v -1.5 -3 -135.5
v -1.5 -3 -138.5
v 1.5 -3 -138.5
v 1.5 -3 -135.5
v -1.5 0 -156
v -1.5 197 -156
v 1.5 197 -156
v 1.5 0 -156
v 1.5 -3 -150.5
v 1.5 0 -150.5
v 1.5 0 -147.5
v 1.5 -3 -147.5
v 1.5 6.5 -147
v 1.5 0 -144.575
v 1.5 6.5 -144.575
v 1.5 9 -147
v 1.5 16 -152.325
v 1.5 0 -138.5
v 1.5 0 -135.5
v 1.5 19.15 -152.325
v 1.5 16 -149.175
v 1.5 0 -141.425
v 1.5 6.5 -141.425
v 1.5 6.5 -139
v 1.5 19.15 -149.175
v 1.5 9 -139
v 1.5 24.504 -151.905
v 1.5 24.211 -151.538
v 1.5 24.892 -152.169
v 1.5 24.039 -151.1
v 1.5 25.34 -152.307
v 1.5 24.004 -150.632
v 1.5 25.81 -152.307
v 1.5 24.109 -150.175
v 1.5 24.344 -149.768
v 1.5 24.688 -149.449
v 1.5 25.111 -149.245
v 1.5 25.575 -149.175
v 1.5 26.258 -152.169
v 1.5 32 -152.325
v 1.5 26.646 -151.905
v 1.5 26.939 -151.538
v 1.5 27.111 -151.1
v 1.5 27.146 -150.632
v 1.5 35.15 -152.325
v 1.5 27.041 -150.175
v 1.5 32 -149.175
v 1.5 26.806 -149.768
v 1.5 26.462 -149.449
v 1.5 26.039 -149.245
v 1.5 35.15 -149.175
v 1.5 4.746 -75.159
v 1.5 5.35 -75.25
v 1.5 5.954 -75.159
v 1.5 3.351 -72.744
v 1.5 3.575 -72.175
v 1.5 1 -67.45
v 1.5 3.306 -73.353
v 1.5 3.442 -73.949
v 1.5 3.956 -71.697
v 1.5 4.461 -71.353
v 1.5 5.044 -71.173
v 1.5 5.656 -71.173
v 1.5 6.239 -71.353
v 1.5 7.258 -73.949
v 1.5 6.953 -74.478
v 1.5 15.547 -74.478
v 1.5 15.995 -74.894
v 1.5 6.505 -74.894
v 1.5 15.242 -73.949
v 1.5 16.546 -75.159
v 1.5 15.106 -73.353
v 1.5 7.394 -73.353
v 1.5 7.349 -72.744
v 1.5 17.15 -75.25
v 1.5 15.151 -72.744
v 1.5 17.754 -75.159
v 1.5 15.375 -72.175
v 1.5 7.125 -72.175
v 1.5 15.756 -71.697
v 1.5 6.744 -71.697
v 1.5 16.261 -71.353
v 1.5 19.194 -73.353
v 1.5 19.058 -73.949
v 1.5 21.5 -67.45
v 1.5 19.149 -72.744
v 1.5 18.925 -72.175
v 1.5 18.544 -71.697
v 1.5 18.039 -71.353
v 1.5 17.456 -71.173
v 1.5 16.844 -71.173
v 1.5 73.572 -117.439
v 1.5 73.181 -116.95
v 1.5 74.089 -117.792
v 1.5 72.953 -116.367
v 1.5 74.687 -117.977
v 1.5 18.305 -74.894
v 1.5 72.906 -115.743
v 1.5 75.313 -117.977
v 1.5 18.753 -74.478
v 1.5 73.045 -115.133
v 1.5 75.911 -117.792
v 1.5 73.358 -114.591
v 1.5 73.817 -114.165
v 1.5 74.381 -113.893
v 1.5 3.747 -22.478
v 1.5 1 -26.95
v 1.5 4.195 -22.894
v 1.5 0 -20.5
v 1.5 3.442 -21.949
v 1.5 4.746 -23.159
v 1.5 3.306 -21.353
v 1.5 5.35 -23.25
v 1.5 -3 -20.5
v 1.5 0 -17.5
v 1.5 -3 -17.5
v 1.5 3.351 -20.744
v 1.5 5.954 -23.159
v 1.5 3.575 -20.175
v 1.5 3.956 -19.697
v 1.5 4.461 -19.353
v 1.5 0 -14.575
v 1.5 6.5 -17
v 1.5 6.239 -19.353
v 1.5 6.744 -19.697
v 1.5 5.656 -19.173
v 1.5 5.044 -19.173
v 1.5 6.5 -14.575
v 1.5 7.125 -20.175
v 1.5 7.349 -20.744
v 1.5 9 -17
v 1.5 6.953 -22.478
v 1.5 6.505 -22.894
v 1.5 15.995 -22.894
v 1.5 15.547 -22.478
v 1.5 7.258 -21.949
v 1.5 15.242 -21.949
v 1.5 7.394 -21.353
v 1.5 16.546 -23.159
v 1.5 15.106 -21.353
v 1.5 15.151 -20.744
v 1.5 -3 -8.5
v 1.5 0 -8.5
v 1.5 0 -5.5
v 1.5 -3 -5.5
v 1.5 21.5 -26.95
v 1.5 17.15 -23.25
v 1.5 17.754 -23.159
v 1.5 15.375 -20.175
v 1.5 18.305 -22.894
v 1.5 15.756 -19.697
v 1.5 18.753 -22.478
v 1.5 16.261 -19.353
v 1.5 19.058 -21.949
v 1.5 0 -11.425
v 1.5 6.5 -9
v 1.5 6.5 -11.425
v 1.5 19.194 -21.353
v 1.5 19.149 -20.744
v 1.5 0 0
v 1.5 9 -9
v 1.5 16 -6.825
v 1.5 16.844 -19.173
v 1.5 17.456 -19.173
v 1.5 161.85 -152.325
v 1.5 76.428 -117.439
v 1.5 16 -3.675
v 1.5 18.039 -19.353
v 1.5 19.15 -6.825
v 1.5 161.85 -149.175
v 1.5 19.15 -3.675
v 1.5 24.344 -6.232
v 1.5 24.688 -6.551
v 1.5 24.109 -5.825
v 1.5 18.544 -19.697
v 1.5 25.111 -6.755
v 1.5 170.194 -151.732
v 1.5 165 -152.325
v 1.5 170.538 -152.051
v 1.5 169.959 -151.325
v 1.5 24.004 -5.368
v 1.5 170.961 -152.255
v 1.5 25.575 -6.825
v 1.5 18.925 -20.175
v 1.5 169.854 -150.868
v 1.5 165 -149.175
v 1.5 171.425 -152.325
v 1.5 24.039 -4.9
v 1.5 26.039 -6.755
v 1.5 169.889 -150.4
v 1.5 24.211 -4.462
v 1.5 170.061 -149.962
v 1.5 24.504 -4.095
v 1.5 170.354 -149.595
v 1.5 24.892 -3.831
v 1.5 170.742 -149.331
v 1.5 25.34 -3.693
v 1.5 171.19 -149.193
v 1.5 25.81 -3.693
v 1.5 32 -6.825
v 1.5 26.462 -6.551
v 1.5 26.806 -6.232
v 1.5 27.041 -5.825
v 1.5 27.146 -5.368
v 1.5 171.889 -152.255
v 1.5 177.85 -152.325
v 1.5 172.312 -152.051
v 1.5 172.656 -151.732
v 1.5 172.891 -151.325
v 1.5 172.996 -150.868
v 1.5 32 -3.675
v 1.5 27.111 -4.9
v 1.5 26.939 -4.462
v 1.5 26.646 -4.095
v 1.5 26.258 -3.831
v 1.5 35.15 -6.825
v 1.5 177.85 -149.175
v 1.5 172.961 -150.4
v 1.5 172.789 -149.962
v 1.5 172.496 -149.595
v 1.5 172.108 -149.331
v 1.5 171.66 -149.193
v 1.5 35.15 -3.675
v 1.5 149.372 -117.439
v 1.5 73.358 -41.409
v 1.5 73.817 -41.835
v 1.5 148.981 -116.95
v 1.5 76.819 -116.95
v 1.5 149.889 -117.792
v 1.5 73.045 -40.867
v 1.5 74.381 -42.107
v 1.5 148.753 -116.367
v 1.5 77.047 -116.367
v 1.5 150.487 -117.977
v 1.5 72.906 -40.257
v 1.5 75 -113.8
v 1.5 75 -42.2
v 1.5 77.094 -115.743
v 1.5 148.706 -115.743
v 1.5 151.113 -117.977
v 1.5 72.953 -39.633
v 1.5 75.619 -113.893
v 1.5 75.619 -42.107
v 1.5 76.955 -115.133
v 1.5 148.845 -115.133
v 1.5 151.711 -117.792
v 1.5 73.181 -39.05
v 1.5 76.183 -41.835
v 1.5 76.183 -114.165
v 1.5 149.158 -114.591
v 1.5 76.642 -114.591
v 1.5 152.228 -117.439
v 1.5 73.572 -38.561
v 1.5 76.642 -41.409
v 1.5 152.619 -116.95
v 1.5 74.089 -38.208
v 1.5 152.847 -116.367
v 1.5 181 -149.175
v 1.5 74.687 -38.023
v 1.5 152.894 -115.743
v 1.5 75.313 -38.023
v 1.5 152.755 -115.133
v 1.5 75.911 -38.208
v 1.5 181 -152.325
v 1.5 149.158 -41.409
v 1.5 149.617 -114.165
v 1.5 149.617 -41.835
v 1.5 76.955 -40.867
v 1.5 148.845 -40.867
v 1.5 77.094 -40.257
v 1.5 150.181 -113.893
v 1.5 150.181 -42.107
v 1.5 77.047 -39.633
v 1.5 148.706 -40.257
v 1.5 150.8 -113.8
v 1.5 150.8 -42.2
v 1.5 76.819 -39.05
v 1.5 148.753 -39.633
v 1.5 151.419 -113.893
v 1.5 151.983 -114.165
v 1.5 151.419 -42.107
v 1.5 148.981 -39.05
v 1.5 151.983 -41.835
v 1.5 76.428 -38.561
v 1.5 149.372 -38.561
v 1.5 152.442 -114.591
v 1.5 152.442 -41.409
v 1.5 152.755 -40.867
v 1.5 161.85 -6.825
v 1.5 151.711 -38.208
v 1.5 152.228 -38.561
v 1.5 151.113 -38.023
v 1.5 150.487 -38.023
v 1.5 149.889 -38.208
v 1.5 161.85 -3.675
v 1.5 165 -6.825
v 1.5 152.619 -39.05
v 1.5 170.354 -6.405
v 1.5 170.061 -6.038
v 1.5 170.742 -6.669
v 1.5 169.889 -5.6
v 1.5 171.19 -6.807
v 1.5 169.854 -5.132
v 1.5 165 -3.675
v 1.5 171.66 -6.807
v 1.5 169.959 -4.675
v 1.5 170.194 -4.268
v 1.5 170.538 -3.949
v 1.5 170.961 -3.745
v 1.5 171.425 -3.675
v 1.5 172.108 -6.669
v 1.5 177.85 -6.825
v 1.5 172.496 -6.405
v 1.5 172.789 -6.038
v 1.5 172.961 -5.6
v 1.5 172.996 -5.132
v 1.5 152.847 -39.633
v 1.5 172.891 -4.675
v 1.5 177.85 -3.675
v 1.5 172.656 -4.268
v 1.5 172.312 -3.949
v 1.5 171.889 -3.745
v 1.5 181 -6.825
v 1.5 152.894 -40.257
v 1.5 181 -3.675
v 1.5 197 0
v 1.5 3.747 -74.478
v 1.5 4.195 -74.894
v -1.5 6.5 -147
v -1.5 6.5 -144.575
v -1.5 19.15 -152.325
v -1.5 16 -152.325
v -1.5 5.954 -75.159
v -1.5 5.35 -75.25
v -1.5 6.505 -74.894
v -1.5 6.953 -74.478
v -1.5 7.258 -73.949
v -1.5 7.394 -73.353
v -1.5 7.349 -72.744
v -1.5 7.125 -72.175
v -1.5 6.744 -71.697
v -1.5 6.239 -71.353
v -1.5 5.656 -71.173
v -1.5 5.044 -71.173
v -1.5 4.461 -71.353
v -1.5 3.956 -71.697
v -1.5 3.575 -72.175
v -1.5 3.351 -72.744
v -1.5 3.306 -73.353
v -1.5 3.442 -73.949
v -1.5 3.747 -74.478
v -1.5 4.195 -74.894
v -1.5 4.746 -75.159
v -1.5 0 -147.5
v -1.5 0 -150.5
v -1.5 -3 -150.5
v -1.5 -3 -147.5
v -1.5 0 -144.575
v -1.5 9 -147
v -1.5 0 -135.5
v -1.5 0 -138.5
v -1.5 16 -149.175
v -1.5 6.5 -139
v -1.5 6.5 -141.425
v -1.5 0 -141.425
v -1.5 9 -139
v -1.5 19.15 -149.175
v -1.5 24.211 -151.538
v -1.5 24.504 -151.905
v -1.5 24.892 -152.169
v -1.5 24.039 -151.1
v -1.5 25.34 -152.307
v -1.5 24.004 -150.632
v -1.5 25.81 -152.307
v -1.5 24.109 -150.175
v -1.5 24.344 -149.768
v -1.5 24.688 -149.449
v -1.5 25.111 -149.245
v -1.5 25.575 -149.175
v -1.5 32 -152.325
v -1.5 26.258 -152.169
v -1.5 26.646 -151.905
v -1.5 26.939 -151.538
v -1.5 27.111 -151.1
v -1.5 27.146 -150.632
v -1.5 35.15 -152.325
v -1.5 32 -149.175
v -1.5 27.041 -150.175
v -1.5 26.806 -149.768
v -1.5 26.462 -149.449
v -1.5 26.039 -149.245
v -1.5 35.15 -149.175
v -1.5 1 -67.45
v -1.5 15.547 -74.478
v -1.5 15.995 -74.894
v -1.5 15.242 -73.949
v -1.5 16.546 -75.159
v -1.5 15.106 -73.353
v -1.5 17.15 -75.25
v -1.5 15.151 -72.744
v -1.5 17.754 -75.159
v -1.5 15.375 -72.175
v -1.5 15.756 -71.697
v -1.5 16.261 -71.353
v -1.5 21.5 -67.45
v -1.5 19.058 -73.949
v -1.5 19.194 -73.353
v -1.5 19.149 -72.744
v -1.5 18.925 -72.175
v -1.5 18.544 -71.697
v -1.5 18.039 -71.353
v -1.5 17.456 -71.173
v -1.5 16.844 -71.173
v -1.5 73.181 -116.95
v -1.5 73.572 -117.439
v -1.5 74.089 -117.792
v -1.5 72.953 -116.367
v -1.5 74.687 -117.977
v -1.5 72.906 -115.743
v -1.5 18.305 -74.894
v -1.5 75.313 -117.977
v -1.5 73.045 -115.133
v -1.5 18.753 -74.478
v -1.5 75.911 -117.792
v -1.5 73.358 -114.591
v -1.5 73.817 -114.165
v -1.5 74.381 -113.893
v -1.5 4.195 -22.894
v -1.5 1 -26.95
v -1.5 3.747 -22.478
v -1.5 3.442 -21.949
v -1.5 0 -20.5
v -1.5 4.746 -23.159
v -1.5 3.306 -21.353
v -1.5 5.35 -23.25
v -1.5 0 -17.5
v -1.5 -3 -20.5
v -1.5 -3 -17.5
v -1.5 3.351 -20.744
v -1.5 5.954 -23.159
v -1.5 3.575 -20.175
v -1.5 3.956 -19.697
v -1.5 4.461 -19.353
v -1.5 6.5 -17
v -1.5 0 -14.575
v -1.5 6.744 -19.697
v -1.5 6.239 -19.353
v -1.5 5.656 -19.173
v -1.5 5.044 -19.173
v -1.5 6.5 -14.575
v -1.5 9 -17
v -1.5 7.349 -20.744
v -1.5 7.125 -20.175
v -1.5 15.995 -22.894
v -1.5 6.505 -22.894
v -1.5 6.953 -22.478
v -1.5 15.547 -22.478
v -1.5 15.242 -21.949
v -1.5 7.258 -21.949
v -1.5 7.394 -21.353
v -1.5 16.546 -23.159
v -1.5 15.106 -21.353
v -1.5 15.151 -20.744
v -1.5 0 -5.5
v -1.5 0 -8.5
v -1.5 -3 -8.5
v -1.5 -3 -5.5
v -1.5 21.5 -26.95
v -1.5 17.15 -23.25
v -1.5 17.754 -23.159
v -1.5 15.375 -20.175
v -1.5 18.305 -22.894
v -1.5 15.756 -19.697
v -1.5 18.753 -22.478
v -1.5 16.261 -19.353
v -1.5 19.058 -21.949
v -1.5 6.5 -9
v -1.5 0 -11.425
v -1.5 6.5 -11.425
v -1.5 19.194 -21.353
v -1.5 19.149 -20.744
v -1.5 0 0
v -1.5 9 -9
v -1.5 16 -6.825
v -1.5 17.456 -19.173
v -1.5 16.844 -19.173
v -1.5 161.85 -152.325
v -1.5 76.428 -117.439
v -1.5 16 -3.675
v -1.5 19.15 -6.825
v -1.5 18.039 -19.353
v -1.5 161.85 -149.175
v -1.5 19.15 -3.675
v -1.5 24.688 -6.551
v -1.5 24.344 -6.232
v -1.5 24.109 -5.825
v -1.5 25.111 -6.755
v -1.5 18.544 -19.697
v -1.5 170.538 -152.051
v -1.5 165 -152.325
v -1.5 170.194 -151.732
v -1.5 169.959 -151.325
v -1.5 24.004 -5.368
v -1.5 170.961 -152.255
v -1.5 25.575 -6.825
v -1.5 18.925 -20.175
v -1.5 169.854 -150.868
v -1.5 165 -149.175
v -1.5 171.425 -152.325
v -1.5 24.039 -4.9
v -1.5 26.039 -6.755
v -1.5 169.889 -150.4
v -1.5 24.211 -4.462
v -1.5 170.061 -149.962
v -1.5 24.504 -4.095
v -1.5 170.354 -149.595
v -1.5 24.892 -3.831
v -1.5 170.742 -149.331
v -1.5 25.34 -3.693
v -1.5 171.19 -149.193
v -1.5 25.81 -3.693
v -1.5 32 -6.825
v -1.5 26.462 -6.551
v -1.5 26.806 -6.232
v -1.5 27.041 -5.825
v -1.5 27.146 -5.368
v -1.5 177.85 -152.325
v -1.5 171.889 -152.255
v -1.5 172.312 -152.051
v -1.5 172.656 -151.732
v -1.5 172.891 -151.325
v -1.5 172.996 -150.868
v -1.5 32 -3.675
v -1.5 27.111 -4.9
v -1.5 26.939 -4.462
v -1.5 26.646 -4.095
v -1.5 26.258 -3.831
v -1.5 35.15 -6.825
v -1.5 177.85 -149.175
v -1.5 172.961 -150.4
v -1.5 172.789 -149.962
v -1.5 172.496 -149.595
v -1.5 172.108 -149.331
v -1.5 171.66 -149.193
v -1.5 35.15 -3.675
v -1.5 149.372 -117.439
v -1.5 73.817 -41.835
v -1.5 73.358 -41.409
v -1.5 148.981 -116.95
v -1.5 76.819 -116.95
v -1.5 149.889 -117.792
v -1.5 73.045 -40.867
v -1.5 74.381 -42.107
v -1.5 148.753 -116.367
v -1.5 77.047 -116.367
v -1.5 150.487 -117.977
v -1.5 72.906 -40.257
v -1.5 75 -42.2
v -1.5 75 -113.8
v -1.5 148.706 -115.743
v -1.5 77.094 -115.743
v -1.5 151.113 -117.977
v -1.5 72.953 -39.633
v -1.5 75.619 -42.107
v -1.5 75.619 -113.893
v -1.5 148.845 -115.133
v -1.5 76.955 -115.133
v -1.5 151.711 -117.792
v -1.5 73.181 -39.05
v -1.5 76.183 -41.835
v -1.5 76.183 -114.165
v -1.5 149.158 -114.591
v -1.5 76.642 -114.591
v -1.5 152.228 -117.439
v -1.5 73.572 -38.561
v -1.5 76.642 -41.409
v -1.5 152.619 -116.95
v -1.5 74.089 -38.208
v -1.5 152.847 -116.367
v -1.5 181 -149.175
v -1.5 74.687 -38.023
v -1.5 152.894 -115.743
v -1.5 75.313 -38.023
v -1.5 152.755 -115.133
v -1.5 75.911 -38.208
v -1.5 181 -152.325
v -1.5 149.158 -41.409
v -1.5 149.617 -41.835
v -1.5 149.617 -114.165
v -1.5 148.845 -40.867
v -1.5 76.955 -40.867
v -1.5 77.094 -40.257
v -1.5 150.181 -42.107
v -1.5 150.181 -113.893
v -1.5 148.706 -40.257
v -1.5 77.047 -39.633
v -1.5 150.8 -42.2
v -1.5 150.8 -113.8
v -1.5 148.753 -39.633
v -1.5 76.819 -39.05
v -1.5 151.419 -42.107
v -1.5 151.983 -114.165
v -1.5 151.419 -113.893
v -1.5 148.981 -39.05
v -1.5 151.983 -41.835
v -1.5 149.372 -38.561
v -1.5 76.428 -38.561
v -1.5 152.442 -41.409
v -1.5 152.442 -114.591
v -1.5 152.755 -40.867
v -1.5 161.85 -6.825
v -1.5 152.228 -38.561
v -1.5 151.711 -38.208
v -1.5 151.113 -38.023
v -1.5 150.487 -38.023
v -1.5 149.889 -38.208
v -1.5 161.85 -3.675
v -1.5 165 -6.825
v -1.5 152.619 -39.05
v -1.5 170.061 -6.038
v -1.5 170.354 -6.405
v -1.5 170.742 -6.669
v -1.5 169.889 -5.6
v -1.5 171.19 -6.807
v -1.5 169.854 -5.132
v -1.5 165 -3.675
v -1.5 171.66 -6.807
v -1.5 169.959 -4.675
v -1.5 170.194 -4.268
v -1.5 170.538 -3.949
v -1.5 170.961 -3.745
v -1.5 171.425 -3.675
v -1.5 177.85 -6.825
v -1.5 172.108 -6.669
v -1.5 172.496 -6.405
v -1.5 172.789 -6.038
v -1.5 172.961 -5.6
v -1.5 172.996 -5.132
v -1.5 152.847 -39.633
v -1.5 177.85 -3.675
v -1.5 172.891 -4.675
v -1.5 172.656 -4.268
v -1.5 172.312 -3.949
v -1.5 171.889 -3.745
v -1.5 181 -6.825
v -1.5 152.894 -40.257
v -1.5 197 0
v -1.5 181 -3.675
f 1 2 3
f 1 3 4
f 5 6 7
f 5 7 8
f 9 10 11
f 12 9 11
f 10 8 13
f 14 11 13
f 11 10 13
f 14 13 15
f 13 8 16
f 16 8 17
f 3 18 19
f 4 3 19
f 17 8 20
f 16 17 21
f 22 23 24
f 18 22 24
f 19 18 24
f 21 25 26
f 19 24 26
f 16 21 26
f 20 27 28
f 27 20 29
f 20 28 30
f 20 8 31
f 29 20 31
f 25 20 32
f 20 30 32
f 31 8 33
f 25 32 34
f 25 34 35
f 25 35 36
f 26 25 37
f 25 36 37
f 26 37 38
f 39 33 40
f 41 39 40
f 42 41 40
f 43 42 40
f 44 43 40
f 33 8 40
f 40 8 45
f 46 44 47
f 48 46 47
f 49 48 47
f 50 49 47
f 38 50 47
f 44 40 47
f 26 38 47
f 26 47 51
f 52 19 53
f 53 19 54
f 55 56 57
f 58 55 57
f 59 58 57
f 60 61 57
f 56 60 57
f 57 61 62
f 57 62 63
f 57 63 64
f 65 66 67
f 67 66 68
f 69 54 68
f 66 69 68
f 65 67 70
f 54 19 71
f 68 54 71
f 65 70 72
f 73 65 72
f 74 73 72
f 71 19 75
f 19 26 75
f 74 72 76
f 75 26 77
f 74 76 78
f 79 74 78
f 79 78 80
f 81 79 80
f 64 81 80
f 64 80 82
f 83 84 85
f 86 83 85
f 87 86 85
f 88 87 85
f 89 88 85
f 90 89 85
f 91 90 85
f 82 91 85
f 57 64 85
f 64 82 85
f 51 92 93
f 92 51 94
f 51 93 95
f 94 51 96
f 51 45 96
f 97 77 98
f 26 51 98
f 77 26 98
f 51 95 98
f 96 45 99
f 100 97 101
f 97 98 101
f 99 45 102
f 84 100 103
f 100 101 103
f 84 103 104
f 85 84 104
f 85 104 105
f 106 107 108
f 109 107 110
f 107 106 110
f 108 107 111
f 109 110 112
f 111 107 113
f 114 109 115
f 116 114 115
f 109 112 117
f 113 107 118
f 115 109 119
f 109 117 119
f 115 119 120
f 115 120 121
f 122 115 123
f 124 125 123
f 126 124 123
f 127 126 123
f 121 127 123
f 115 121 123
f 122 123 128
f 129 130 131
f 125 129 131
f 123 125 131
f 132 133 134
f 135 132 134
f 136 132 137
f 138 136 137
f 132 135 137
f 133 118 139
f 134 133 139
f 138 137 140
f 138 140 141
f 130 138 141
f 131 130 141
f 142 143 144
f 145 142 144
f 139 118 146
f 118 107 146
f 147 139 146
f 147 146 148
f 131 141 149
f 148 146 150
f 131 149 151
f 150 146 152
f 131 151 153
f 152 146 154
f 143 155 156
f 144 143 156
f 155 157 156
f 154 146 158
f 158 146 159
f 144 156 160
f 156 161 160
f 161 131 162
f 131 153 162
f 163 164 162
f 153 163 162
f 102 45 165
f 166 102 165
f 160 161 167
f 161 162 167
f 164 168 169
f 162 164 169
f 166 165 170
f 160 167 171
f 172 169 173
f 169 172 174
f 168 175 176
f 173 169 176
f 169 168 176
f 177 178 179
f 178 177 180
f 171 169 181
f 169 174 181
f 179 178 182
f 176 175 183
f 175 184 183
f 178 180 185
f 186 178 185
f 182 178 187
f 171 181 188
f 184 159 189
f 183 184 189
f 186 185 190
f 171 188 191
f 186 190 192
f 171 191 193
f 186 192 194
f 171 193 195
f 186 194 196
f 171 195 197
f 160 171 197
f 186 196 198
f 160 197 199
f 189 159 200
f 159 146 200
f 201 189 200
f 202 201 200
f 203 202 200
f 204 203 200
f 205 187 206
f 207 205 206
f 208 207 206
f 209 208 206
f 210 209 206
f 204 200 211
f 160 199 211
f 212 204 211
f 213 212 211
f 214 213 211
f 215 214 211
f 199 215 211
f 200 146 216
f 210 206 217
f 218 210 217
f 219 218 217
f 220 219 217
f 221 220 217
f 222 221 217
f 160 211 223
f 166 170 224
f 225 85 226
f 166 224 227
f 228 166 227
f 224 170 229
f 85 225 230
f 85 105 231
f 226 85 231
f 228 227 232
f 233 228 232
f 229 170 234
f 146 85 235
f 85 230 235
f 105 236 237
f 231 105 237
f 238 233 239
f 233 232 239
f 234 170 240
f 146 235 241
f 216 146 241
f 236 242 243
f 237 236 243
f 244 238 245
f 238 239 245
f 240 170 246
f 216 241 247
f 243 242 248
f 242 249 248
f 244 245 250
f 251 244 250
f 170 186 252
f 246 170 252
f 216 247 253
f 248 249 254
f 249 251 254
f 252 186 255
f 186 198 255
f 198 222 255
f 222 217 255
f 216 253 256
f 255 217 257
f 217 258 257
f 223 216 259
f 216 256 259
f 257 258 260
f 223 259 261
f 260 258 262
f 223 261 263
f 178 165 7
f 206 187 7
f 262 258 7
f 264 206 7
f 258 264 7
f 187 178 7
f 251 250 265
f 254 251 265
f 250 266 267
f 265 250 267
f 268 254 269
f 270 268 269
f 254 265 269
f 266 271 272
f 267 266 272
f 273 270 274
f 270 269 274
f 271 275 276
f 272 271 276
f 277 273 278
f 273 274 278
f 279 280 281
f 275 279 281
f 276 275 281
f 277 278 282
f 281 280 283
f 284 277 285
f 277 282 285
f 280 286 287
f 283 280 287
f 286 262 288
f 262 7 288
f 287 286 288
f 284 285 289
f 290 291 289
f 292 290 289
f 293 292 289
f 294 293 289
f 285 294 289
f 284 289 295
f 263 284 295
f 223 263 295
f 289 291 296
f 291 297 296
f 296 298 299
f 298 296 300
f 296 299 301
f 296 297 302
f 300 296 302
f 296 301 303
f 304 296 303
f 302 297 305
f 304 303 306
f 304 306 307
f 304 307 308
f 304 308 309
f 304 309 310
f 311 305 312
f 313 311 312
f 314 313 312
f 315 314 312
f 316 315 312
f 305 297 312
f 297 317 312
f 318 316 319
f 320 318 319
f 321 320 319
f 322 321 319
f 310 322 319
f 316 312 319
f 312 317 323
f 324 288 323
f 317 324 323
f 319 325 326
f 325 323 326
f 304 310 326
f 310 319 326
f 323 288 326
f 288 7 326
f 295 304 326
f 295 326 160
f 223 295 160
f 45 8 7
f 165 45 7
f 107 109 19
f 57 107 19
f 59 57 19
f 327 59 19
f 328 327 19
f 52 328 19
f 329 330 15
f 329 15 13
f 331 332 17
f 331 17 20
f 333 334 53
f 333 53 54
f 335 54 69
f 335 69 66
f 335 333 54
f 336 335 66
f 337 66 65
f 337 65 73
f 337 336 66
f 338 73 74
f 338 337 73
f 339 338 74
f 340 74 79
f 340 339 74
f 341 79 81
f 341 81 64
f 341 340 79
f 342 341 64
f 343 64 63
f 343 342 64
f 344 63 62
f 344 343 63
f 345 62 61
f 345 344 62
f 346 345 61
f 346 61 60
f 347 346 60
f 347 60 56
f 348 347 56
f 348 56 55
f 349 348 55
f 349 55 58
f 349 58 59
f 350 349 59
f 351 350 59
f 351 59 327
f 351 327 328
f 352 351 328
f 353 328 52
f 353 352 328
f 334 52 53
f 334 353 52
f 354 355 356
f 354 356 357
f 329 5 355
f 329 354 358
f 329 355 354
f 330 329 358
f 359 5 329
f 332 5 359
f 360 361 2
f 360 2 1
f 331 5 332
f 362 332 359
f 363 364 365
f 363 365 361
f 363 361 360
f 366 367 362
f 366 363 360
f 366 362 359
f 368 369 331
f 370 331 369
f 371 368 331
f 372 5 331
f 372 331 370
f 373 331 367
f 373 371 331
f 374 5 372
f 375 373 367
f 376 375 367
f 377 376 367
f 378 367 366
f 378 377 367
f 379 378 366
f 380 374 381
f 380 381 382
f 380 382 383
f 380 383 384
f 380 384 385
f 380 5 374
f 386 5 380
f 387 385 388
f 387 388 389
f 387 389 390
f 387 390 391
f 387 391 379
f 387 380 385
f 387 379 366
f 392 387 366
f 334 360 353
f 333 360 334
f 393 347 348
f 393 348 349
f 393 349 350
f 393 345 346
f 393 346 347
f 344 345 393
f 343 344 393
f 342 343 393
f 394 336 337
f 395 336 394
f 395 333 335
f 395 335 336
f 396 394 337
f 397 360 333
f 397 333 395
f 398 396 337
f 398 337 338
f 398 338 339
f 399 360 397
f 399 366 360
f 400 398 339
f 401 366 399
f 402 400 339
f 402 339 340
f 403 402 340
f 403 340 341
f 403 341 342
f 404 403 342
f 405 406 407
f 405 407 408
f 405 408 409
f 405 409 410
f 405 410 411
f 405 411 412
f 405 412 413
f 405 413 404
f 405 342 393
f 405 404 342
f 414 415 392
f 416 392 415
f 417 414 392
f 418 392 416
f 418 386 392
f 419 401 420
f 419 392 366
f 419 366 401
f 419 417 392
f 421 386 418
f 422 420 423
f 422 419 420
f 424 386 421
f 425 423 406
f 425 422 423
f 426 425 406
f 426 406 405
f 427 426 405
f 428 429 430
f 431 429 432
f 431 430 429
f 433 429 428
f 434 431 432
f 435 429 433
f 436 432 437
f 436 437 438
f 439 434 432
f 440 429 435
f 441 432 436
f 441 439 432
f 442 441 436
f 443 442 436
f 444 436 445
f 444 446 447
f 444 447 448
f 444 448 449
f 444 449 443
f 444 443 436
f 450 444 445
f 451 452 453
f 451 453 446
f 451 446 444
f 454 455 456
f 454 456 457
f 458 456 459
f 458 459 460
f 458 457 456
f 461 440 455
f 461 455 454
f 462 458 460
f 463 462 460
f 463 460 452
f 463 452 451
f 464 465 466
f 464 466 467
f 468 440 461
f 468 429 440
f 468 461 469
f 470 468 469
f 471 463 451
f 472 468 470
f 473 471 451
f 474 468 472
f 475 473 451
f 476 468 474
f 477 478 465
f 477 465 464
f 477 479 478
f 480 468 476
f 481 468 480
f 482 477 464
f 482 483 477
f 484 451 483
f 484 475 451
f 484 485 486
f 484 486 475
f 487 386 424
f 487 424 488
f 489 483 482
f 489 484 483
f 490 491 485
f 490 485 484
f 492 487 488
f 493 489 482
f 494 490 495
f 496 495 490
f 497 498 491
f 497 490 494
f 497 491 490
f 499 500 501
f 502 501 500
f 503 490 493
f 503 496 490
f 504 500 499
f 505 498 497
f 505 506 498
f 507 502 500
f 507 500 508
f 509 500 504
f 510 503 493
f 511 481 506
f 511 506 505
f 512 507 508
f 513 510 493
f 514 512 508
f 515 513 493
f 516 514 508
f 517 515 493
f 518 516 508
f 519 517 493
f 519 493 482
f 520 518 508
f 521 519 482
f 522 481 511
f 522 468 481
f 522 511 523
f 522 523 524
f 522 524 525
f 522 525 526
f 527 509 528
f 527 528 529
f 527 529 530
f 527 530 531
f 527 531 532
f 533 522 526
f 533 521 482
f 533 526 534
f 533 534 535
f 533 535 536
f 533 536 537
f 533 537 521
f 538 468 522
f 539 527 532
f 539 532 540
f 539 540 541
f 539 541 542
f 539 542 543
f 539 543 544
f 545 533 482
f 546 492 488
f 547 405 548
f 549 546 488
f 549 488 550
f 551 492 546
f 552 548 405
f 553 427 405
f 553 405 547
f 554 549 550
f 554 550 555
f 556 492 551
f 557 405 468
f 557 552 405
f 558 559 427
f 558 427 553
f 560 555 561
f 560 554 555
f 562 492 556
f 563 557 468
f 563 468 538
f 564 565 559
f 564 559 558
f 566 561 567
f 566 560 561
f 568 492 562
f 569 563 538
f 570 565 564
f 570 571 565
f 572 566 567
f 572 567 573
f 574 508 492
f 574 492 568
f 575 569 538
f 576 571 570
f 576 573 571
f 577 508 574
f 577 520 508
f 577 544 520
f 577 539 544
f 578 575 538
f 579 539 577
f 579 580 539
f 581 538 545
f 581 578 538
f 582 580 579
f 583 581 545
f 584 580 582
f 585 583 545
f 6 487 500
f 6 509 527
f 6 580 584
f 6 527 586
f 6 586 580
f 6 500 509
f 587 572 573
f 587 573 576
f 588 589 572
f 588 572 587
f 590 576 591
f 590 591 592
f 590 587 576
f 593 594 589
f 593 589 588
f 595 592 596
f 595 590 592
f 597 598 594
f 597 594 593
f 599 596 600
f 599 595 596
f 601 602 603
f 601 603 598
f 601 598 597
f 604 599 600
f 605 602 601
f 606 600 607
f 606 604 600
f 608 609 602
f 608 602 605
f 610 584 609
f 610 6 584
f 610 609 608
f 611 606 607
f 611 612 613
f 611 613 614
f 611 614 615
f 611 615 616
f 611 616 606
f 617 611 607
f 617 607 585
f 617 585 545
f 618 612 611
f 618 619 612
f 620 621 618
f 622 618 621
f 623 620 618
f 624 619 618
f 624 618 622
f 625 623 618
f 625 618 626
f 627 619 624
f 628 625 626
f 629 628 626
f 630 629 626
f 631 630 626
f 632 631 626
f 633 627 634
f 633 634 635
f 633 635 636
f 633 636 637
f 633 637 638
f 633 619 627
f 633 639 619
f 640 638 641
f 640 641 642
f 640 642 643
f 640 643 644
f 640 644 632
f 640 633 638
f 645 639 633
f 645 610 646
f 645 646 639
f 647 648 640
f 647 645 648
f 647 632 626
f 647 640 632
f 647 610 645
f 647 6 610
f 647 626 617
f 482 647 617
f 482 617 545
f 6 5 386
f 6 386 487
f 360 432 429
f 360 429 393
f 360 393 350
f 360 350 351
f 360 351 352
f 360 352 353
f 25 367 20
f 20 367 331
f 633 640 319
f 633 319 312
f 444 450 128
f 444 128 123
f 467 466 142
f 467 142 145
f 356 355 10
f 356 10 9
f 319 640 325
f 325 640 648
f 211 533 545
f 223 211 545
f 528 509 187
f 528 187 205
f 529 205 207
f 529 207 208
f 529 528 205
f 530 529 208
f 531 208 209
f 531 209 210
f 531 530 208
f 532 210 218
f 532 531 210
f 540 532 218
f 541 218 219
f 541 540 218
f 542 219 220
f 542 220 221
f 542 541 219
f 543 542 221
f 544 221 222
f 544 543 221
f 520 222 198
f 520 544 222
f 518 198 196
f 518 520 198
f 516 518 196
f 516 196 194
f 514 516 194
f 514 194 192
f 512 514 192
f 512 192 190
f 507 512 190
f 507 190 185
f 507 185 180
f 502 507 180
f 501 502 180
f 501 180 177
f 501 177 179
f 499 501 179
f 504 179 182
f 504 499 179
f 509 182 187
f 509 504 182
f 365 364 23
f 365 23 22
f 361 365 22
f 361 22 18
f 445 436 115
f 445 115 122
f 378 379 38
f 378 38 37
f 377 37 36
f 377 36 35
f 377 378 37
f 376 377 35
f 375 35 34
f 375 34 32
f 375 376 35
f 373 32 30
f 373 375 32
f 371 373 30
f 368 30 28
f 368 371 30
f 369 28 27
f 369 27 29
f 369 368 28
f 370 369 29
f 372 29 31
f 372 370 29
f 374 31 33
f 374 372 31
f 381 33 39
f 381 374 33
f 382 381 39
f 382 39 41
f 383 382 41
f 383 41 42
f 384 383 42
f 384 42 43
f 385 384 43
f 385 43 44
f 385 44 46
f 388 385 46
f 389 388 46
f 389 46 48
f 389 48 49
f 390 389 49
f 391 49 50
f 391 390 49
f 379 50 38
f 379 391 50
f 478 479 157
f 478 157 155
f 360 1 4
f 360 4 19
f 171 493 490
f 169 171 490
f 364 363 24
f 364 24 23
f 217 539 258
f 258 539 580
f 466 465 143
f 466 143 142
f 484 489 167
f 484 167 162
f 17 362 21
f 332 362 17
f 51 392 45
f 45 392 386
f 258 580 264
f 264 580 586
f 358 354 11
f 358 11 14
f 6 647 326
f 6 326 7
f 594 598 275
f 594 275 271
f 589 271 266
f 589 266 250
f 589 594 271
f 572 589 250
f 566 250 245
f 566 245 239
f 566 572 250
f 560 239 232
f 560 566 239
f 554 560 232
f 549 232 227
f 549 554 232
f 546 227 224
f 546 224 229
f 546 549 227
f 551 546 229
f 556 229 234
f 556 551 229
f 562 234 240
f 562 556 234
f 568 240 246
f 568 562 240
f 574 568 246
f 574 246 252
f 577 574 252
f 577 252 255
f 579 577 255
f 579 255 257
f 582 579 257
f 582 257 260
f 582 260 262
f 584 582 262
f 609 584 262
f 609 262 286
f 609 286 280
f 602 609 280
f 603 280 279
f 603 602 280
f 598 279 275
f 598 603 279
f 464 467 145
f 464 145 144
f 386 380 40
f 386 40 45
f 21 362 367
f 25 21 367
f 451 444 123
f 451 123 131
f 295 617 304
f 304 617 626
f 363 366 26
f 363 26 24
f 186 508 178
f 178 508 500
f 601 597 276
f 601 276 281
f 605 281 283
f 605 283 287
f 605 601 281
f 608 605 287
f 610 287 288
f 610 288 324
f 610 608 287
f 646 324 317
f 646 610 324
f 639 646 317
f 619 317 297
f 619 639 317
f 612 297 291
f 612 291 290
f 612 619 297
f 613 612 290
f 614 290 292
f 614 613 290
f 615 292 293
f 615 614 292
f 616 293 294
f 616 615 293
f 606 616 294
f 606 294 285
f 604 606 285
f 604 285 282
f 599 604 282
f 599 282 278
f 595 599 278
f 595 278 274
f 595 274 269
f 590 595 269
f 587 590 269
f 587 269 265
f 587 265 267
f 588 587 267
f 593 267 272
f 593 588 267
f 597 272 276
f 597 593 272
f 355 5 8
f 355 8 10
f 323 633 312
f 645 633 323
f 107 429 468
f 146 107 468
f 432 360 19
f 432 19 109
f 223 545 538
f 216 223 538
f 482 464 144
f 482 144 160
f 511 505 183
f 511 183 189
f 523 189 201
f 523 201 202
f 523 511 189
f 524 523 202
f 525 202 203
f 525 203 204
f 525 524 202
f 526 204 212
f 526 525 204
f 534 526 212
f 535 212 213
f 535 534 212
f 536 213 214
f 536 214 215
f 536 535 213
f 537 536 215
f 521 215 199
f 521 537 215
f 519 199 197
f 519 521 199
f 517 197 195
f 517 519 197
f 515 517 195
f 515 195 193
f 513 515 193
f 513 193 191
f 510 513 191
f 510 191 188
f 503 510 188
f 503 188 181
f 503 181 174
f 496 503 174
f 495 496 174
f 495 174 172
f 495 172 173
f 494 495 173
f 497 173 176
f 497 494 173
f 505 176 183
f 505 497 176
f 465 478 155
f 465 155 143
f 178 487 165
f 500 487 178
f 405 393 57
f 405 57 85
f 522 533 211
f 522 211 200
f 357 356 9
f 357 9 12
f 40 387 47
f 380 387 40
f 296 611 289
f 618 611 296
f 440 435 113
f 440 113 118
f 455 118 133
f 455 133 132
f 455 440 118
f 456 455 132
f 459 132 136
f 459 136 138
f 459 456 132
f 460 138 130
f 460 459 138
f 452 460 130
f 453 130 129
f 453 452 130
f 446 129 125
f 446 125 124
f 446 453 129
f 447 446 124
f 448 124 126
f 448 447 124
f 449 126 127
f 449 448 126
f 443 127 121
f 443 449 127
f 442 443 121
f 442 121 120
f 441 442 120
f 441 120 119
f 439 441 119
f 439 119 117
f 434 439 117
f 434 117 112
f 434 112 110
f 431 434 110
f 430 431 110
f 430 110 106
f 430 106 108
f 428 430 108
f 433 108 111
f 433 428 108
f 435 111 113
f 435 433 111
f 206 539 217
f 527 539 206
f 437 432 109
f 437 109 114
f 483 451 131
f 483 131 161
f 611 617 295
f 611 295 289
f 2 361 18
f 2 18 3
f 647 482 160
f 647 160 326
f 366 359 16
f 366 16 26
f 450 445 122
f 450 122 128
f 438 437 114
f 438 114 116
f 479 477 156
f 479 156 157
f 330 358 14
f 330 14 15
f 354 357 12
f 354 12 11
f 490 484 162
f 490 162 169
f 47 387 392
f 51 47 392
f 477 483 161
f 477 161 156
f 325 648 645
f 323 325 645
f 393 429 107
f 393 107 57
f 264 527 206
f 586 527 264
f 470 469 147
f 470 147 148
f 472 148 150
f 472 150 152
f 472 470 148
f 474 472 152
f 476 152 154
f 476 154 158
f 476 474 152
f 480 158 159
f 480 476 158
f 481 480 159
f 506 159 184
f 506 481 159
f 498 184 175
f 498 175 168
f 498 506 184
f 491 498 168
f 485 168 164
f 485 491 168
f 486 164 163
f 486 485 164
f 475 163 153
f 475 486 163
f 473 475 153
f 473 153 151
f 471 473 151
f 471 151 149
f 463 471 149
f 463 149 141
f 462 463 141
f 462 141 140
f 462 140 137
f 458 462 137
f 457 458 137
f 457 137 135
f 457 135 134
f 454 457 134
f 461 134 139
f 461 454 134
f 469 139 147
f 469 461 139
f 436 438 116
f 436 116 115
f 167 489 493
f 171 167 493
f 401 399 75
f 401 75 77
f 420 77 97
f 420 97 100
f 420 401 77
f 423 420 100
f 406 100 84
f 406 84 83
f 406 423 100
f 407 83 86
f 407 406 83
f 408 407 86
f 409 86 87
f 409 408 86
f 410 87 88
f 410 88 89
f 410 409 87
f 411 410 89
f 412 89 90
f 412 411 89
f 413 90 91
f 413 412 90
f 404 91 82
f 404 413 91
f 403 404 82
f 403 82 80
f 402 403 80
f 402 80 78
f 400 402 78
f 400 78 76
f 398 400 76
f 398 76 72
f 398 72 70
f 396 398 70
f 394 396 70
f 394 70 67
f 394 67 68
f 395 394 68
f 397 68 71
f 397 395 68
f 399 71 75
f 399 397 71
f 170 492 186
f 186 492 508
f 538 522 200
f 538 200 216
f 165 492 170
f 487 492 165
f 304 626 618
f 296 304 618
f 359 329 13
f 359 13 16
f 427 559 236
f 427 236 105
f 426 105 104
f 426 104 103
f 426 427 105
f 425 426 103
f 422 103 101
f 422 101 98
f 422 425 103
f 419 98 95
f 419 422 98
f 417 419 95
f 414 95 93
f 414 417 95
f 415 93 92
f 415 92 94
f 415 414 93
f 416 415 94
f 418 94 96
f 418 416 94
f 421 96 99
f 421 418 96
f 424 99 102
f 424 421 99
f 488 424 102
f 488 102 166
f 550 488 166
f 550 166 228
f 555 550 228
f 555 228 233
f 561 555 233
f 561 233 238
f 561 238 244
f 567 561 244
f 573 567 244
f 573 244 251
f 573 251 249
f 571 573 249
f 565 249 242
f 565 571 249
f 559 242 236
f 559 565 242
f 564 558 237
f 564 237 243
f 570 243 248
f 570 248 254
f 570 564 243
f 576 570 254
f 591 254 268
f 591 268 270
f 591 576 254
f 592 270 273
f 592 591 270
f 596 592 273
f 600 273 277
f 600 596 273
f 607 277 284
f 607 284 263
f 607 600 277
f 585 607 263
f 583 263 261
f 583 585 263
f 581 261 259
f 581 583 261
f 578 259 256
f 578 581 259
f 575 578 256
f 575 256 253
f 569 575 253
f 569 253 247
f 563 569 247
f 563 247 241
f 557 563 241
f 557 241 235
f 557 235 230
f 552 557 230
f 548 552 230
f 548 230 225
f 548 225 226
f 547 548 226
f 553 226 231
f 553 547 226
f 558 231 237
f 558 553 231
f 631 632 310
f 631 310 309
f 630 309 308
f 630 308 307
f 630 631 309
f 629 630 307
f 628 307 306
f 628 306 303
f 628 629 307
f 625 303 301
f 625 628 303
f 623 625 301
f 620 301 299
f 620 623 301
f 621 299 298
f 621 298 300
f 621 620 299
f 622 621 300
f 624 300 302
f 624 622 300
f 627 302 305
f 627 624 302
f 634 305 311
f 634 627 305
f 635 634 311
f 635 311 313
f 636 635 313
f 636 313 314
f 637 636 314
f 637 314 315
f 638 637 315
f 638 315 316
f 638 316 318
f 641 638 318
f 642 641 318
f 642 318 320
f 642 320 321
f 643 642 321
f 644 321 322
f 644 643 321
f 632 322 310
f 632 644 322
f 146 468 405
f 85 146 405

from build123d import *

# Parameters (mm, degrees)
BOSS_EXTRUDE2_DEPTH      = 1.5
BOSS_EXTRUDE2_DEPTH_BACK = 1.5
SKETCH1_R                = 1.575
SKETCH1_R_2              = 2.05
SKETCH1_R_3              = 2.1
SKETCH1_W                = 40.5
SKETCH1_H                = 20.499999995
SKETCH1_W_2              = 3.15
SKETCH1_H_2              = 3.15


with BuildPart() as part:
    # Sketch1 → Boss-Extrude2 (new, two sides: drawn at the far end of the back side and taken through both)
    with BuildSketch(Plane(origin=(0, 0, 0), x_dir=(0, 0, -1), z_dir=(1, 0, 0)).offset(-BOSS_EXTRUDE2_DEPTH_BACK)):
        Polygon((11.425, 0), (8.5, 0), (8.5, -3), (5.5, -3), (5.5, 0), (0, 0), (0, 197), (156, 197), (156, 0), (150.5, 0), (150.5, -3), (147.5, -3), (147.5, 0), (144.575, 0), (144.575, 6.5), (147, 6.5), (147, 9), (139, 9), (139, 6.5), (141.425, 6.5), (141.425, 0), (138.5, 0), (138.5, -3), (135.5, -3), (135.5, 0), (20.5, 0), (20.5, -3), (17.5, -3), (17.5, 0), (14.575, 0), (14.575, 6.5), (17, 6.5), (17, 9), (9, 9), (9, 6.5), (11.425, 6.5), align=None)
        with Locations((5.25, 25.575)):
            Circle(SKETCH1_R, mode=Mode.SUBTRACT)
        with Locations((5.25, 171.425)):
            Circle(SKETCH1_R, mode=Mode.SUBTRACT)
        with Locations((150.75, 171.425)):
            Circle(SKETCH1_R, mode=Mode.SUBTRACT)
        with Locations((150.75, 25.575)):
            Circle(SKETCH1_R, mode=Mode.SUBTRACT)
        with Locations((73.2, 5.35)):
            Circle(SKETCH1_R_2, mode=Mode.SUBTRACT)
        with Locations((73.2, 17.149999995)):
            Circle(SKETCH1_R_2, mode=Mode.SUBTRACT)
        with Locations((21.2, 5.35)):
            Circle(SKETCH1_R_2, mode=Mode.SUBTRACT)
        with Locations((21.2, 17.149999995)):
            Circle(SKETCH1_R_2, mode=Mode.SUBTRACT)
        with Locations((40.1, 75)):
            Circle(SKETCH1_R_3, mode=Mode.SUBTRACT)
        with Locations((40.1, 150.8)):
            Circle(SKETCH1_R_3, mode=Mode.SUBTRACT)
        with Locations((115.9, 75)):
            Circle(SKETCH1_R_3, mode=Mode.SUBTRACT)
        with Locations((115.9, 150.8)):
            Circle(SKETCH1_R_3, mode=Mode.SUBTRACT)
        with Locations((47.2, 11.249999997)):
            Rectangle(SKETCH1_W, SKETCH1_H, mode=Mode.SUBTRACT)
        with Locations((5.25, 17.575)):
            Rectangle(SKETCH1_W_2, SKETCH1_H_2, mode=Mode.SUBTRACT)
        with Locations((5.25, 33.575)):
            Rectangle(SKETCH1_W_2, SKETCH1_H_2, mode=Mode.SUBTRACT)
        with Locations((5.25, 163.425)):
            Rectangle(SKETCH1_W_2, SKETCH1_H_2, mode=Mode.SUBTRACT)
        with Locations((5.25, 179.425)):
            Rectangle(SKETCH1_W_2, SKETCH1_H_2, mode=Mode.SUBTRACT)
        with Locations((150.75, 179.425)):
            Rectangle(SKETCH1_W_2, SKETCH1_H_2, mode=Mode.SUBTRACT)
        with Locations((150.75, 163.425)):
            Rectangle(SKETCH1_W_2, SKETCH1_H_2, mode=Mode.SUBTRACT)
        with Locations((150.75, 33.575)):
            Rectangle(SKETCH1_W_2, SKETCH1_H_2, mode=Mode.SUBTRACT)
        with Locations((150.75, 17.575)):
            Rectangle(SKETCH1_W_2, SKETCH1_H_2, mode=Mode.SUBTRACT)
    extrude(amount=BOSS_EXTRUDE2_DEPTH + BOSS_EXTRUDE2_DEPTH_BACK)


solid = part.part
